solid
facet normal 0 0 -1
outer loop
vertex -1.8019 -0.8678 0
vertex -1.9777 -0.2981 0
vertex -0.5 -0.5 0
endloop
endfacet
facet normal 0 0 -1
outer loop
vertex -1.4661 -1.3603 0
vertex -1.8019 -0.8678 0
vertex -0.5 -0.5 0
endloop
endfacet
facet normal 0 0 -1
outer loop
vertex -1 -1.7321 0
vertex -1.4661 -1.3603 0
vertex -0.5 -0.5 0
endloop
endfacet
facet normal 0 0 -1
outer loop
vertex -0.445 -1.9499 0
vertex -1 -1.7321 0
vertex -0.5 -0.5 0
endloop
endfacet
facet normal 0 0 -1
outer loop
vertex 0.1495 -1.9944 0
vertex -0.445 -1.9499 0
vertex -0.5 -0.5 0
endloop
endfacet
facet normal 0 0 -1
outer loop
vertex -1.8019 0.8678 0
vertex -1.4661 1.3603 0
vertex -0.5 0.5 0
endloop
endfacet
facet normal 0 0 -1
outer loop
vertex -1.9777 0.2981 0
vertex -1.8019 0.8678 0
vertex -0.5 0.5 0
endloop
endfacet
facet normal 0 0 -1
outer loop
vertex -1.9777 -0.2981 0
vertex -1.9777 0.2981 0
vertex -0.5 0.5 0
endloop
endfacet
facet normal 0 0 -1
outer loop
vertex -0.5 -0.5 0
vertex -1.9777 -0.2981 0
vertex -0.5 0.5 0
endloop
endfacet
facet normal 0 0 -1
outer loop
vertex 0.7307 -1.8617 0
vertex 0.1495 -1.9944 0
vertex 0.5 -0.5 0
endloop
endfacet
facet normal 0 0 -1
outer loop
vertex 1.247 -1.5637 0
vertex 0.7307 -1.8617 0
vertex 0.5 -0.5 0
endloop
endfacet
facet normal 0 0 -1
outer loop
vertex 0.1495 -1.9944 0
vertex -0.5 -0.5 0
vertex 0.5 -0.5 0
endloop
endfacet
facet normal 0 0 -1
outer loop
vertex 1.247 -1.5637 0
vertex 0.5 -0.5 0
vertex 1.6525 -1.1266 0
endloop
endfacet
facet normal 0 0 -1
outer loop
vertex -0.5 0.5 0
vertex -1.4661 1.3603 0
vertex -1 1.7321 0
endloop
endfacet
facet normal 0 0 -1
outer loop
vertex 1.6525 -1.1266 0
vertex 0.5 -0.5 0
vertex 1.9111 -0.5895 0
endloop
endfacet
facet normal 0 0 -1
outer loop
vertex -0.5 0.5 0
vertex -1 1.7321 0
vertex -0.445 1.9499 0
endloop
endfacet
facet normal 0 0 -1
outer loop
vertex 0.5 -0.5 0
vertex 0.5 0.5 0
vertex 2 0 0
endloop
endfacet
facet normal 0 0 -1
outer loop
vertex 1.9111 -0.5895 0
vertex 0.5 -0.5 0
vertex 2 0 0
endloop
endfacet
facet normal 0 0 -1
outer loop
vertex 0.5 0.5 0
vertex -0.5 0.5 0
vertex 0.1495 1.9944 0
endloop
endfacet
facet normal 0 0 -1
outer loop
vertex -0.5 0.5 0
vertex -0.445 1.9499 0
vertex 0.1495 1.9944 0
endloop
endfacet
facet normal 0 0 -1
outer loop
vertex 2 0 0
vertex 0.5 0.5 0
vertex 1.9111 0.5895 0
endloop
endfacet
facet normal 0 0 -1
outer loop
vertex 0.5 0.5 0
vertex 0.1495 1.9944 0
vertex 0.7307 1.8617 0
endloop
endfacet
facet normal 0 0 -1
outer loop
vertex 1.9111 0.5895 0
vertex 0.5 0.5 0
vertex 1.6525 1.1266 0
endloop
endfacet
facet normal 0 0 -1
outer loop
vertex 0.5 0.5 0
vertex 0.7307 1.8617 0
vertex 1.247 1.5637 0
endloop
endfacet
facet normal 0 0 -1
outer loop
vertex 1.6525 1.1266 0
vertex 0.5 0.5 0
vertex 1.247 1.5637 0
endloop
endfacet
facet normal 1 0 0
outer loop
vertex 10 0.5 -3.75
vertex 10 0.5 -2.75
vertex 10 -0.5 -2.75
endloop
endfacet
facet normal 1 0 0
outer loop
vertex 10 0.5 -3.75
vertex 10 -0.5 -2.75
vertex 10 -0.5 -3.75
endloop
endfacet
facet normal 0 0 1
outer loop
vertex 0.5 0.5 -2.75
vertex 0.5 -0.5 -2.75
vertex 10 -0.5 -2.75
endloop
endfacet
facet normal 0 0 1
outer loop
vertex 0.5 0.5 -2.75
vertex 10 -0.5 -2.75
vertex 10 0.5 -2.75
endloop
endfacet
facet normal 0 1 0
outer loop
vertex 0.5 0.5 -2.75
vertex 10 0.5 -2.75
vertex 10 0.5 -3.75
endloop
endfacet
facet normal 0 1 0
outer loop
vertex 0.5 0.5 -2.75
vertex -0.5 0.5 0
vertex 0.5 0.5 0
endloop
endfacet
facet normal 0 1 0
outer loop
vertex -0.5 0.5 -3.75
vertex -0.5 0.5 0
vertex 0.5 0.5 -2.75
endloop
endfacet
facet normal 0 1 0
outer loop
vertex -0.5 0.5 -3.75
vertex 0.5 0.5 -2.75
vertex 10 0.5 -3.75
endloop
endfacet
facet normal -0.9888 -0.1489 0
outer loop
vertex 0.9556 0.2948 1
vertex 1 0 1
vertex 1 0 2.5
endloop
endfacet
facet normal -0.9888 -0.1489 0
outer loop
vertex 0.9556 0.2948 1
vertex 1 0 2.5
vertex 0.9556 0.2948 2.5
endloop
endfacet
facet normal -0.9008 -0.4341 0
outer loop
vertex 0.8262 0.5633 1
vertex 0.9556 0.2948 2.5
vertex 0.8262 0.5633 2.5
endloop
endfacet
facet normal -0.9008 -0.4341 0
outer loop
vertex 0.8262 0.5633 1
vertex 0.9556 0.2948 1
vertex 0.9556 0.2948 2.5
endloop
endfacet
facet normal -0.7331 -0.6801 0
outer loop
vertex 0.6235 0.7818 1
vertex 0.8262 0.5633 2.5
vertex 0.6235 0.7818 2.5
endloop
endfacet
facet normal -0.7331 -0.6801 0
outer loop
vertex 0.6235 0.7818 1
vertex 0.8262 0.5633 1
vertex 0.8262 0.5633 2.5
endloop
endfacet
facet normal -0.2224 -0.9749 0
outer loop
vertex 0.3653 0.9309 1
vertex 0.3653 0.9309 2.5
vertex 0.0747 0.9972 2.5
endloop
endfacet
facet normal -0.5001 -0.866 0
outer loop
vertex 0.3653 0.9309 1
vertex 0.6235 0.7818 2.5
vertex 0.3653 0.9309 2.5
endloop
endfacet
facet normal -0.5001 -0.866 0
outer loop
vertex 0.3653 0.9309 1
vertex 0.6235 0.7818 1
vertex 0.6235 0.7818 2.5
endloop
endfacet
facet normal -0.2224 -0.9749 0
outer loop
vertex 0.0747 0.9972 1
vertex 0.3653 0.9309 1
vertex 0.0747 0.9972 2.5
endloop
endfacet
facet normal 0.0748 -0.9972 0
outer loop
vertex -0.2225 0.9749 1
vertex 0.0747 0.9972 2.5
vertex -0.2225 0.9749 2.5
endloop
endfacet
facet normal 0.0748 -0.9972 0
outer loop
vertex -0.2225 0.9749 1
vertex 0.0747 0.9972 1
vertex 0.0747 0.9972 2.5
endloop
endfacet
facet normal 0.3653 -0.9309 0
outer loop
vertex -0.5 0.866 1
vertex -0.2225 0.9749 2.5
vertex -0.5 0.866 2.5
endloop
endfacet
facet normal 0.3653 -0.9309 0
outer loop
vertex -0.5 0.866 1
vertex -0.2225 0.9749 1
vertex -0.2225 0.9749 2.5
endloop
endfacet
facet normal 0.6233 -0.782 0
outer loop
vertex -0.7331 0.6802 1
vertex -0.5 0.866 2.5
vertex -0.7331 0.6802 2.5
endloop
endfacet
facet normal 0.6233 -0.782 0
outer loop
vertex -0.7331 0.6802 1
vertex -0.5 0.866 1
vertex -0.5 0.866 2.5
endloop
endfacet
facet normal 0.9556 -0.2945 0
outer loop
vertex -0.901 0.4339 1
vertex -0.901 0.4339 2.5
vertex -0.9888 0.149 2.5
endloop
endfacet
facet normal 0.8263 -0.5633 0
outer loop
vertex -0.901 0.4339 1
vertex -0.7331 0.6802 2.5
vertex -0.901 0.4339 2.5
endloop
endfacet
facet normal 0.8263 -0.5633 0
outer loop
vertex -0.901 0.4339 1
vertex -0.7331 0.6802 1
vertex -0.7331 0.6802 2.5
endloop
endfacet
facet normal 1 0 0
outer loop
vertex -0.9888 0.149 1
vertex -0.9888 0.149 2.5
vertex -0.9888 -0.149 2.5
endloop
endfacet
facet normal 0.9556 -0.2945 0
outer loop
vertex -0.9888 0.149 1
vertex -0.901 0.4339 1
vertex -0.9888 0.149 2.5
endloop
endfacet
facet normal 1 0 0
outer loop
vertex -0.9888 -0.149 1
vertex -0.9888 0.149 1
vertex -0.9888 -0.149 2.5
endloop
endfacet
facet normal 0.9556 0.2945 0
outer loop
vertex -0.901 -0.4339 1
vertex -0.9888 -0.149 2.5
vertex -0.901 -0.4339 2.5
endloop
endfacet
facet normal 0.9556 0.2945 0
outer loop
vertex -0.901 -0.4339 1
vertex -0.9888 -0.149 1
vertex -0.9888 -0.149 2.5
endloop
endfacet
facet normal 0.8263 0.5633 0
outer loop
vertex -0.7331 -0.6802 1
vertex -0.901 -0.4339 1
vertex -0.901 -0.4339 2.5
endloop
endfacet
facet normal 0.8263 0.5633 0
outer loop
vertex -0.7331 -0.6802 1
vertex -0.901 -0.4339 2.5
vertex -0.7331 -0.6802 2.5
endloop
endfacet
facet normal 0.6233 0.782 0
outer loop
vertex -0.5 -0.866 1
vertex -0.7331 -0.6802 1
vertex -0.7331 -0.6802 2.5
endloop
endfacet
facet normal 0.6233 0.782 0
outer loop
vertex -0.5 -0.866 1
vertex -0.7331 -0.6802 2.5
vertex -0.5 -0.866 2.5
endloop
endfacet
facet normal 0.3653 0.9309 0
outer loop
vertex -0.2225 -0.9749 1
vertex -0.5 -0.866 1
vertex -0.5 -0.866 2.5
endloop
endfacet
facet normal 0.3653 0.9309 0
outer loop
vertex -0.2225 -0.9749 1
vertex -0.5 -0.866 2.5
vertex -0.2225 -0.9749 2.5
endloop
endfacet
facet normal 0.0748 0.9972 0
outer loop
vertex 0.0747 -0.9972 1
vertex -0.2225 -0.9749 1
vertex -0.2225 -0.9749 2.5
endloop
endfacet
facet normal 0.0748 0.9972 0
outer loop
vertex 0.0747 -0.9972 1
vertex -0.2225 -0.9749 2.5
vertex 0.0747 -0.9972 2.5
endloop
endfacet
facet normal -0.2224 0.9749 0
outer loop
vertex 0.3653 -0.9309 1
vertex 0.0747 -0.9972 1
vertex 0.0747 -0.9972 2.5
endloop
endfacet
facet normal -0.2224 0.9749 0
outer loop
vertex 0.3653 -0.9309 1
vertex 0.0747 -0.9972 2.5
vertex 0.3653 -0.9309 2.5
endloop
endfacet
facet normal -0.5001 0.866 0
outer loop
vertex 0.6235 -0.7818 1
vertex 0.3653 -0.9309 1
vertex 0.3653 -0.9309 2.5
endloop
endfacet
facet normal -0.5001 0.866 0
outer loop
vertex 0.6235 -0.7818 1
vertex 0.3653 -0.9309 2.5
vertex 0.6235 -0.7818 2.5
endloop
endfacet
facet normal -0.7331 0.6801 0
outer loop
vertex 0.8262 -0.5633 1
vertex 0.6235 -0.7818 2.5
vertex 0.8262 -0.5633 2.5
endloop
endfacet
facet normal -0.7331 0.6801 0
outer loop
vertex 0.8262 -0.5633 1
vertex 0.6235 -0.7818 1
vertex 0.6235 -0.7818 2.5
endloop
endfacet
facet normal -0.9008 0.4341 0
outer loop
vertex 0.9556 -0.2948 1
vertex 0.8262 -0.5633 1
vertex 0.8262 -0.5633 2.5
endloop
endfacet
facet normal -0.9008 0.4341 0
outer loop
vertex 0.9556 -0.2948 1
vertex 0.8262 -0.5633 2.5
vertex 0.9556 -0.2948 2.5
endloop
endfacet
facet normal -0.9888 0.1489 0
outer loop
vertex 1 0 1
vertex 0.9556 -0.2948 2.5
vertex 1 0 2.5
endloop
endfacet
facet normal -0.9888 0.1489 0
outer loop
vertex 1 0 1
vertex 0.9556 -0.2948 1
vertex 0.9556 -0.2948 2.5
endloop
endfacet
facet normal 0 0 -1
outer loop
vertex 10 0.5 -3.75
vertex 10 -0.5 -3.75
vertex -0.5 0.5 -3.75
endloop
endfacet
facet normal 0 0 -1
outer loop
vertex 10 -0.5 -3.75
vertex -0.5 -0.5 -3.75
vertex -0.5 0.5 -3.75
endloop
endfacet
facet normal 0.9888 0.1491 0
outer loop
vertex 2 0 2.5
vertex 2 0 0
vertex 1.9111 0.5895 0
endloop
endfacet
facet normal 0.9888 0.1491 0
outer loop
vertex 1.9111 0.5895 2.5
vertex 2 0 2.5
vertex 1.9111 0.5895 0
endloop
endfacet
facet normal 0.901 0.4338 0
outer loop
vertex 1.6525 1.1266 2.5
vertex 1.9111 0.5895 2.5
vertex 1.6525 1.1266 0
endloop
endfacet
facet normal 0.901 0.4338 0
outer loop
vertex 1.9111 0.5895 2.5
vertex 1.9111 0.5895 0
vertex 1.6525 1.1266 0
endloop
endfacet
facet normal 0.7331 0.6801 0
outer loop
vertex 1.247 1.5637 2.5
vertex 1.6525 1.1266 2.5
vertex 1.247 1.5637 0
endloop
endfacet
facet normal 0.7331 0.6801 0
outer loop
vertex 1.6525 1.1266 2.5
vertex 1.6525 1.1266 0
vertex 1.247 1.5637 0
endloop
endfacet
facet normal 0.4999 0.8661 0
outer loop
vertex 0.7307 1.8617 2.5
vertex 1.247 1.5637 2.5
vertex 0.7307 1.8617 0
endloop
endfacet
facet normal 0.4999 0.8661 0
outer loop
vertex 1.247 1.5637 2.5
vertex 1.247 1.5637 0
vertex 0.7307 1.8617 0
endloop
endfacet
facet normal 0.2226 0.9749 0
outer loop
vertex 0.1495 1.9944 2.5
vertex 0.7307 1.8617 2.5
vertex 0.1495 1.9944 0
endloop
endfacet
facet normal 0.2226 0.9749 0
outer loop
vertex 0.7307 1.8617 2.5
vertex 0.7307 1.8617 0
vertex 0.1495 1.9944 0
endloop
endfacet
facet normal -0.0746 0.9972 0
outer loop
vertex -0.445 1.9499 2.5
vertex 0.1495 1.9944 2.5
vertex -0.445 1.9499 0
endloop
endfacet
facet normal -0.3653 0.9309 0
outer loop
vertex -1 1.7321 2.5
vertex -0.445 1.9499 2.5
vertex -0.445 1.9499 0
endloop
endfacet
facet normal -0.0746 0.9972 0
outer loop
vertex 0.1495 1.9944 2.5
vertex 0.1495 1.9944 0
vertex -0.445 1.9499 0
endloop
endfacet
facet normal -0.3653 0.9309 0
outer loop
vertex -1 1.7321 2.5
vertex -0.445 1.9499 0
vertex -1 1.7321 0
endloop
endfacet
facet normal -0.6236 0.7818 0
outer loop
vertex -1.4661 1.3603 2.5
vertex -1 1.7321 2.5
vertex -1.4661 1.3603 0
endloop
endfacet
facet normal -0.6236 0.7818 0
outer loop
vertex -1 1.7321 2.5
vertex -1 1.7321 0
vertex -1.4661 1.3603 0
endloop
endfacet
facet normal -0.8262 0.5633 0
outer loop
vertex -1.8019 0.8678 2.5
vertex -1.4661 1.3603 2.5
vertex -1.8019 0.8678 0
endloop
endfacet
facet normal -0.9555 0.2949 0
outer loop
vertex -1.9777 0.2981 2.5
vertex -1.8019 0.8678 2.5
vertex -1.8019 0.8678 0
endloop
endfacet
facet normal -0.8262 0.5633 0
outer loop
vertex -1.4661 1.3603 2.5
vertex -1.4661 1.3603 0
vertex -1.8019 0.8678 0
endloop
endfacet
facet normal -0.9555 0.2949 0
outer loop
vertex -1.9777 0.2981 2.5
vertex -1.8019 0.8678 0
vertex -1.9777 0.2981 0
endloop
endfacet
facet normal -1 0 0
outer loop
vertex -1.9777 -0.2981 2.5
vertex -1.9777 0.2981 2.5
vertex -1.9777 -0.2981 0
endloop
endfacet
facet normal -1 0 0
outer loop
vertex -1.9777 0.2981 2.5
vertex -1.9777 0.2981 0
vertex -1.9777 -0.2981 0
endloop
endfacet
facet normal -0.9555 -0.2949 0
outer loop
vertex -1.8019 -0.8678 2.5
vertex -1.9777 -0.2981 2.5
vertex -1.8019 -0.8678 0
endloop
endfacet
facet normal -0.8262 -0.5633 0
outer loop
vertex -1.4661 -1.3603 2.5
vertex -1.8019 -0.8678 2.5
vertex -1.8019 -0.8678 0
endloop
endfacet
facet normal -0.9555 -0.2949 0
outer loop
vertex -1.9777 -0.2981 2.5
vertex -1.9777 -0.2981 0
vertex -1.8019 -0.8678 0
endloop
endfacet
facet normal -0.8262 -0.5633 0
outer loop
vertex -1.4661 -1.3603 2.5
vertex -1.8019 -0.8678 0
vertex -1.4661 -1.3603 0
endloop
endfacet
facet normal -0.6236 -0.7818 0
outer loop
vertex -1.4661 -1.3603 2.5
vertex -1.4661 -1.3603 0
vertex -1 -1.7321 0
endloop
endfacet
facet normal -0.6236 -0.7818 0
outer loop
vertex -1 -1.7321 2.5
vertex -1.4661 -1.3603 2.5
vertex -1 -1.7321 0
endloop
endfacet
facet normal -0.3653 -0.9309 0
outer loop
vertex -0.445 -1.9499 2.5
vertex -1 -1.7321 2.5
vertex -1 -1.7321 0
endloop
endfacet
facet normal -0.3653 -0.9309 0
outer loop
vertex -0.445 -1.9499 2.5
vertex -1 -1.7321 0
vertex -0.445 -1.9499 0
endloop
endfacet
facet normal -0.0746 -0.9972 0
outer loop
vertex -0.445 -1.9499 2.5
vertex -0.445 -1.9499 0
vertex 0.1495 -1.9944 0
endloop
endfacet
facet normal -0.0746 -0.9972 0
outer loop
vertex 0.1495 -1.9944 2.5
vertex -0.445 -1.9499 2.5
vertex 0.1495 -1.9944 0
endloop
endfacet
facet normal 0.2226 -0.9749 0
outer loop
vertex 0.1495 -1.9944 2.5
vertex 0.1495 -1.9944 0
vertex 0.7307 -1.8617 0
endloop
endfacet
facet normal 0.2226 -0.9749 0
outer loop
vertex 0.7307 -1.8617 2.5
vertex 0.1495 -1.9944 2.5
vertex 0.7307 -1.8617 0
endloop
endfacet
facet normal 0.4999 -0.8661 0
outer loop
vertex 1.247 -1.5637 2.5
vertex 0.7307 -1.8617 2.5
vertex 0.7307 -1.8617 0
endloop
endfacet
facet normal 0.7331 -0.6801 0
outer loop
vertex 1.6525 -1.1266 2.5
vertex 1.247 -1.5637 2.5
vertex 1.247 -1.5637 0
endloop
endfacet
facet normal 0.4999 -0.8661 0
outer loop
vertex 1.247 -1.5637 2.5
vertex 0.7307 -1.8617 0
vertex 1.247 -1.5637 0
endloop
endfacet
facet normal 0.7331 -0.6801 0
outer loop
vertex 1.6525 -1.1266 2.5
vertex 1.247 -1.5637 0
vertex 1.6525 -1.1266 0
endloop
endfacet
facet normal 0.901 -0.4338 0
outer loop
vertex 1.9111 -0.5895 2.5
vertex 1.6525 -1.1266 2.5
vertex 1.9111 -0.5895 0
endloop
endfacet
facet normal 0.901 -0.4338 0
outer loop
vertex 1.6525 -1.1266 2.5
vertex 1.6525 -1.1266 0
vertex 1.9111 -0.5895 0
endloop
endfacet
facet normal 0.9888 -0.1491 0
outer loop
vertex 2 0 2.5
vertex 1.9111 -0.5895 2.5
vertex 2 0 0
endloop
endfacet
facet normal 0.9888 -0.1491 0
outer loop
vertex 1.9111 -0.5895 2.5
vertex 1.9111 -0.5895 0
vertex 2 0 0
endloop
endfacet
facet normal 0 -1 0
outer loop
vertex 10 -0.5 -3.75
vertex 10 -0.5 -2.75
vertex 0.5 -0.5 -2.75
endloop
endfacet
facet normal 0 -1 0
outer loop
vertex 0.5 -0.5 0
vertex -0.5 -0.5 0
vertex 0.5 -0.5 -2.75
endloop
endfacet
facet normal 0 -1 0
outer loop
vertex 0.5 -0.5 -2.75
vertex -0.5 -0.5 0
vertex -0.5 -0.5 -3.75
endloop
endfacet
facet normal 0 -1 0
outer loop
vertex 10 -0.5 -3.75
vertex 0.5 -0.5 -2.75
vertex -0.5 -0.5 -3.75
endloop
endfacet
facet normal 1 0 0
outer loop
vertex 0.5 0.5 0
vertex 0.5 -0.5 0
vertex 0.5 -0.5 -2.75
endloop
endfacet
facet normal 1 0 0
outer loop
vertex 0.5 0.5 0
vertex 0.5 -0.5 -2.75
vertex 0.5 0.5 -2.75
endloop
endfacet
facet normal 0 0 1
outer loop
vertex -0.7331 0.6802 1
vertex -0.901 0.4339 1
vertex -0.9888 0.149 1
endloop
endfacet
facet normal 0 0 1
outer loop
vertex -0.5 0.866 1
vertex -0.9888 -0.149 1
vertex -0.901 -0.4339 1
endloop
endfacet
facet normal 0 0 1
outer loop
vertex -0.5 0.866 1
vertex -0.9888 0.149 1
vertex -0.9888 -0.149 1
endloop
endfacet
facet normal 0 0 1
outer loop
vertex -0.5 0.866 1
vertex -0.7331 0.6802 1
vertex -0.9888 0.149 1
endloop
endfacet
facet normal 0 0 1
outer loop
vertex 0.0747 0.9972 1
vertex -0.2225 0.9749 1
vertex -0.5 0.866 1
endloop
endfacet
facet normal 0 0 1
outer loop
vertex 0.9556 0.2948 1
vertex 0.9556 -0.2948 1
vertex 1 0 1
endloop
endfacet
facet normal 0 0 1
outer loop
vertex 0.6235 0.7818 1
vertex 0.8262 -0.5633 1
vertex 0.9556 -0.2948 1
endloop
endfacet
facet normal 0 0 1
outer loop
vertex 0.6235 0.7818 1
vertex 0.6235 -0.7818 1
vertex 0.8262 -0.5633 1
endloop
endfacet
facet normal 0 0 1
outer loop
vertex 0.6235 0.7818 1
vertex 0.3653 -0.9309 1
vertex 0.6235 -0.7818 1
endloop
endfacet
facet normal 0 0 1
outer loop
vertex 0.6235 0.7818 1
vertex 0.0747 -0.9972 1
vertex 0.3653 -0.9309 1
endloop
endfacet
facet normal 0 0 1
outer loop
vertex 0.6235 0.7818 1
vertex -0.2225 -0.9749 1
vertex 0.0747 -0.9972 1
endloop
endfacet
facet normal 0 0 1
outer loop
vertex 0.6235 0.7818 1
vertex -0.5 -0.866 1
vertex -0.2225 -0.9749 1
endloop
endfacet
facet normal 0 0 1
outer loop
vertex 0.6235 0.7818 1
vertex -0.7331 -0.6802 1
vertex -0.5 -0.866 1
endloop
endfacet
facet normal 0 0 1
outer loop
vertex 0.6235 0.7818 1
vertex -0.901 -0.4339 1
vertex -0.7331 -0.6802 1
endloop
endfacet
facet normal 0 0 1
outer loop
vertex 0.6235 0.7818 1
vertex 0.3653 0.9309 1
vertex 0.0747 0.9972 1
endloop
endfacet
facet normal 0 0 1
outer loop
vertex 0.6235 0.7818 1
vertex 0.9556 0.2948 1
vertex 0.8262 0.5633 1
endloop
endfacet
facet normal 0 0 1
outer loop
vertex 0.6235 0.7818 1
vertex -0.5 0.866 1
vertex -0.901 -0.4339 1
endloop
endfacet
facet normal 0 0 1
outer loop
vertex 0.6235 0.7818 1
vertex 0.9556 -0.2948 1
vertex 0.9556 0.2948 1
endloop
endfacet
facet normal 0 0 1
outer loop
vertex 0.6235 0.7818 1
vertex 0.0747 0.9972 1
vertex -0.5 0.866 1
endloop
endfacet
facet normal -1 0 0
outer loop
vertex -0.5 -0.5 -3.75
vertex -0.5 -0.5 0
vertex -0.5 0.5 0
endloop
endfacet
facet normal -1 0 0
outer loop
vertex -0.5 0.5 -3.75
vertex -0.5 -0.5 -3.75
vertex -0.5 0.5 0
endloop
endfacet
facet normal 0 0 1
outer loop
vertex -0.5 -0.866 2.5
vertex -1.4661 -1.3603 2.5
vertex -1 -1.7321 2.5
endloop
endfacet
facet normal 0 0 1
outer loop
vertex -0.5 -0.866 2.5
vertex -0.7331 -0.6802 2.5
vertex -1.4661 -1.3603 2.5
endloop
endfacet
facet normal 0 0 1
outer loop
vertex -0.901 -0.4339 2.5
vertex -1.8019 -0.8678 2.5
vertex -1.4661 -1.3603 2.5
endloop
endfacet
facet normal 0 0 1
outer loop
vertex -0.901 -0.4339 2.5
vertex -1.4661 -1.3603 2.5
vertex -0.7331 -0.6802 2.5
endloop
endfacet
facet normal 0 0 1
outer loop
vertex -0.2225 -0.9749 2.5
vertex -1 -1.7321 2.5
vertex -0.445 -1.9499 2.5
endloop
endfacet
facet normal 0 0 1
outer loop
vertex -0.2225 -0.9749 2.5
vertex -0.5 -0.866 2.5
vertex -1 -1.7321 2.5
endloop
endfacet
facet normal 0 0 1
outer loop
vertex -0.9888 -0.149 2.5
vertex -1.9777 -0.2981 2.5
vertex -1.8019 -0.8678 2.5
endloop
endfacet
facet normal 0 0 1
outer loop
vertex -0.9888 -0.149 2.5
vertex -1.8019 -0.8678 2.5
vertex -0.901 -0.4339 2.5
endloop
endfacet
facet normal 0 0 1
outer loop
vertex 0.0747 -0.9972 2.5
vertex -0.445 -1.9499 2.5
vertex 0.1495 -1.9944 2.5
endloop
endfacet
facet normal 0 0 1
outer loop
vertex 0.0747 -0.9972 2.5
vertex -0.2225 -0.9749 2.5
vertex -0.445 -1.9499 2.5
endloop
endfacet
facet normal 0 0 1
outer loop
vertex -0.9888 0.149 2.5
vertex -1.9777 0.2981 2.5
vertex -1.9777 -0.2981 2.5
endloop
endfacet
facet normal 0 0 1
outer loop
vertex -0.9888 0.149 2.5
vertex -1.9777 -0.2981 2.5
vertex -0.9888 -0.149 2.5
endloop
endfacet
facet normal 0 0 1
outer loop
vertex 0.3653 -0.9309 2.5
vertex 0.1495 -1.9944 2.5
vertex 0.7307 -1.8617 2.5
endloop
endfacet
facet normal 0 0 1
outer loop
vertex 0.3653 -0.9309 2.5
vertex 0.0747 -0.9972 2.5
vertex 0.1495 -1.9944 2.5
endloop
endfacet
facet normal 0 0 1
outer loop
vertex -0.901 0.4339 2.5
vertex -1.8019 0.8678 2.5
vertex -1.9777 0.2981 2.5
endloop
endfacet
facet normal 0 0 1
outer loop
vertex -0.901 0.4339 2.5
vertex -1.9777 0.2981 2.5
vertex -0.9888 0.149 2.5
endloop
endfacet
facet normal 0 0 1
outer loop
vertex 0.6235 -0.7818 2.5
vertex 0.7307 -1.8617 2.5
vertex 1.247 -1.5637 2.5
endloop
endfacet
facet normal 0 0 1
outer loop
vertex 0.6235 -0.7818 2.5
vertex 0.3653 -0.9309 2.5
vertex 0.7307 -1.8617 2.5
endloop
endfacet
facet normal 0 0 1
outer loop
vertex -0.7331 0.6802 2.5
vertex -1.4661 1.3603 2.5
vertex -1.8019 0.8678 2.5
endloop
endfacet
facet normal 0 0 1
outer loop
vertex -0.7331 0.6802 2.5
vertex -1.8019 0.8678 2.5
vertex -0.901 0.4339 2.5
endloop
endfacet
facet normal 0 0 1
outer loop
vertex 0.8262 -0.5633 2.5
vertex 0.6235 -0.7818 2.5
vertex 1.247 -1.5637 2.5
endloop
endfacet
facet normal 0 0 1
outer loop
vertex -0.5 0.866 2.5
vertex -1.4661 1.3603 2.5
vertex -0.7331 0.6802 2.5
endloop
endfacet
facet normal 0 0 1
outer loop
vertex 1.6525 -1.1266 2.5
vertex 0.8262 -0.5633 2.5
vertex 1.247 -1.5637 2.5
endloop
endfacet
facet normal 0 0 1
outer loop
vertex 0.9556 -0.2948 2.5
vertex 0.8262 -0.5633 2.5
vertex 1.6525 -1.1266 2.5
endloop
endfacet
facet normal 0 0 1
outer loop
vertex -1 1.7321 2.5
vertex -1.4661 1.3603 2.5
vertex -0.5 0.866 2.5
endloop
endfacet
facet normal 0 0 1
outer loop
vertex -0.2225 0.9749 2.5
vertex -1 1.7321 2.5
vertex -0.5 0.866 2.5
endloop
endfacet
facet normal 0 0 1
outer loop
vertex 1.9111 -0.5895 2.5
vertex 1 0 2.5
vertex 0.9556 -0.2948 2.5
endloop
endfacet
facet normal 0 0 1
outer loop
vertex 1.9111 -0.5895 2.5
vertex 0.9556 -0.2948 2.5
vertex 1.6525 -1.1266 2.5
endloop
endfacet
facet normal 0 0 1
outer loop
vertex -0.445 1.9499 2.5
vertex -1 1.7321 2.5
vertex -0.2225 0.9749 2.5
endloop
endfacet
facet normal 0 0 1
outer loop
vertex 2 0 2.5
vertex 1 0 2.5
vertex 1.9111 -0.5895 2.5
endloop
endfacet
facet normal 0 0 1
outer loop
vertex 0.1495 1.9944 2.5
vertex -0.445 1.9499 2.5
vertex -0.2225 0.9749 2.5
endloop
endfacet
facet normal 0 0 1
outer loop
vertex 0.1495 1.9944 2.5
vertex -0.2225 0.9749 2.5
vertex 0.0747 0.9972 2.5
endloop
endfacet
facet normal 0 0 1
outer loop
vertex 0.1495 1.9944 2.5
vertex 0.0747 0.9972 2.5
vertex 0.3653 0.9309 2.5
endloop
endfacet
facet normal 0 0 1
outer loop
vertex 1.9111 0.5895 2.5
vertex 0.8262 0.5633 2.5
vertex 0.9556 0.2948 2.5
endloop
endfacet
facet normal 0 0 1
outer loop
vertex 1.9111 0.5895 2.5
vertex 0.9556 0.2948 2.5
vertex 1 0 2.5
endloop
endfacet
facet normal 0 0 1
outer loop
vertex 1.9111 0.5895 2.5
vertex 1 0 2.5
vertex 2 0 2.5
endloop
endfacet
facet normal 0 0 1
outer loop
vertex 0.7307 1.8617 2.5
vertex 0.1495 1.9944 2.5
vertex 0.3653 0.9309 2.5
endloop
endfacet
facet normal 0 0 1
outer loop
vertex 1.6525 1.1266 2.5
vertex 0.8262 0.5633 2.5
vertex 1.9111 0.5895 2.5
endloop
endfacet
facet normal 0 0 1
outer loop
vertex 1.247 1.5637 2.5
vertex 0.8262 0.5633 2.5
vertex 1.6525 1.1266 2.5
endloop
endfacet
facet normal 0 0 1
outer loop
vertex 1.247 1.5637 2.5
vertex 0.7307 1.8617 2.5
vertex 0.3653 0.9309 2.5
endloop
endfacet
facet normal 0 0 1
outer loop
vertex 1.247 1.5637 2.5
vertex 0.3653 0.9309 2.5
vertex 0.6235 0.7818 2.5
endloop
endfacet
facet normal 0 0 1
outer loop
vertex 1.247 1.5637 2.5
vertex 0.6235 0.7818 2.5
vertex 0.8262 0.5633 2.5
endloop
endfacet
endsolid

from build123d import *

# Parameters (mm, degrees)
SKETCH1_R           = 2
BOSS_EXTRUDE1_DEPTH = 2.5
SHELL1_T            = -1
SKETCH2_W           = 1
SKETCH2_H           = 1
BOSS_EXTRUDE2_DEPTH = 3.75
SKETCH3_W           = 1
SKETCH3_H           = 1
BOSS_EXTRUDE3_DEPTH = 9.5


with BuildPart() as part:
    # Sketch1 → Boss-Extrude1 (new body)
    with BuildSketch(Plane.XY):
        Circle(SKETCH1_R)
    extrude(amount=BOSS_EXTRUDE1_DEPTH)

    # Shell1
    shell1_openings = [part.faces().sort_by_distance(p)[0] for p in [
        (0, 0, 2.5),
    ]]
    offset(amount=SHELL1_T, openings=shell1_openings, kind=Kind.INTERSECTION)

    # Sketch2 → Boss-Extrude2 (add)
    with BuildSketch(Plane(origin=(0, 0, 0), x_dir=(-1, 0, 0), z_dir=(0, 0, -1))):
        Rectangle(SKETCH2_W, SKETCH2_H)
    extrude(amount=BOSS_EXTRUDE2_DEPTH)

    # Sketch3 → Boss-Extrude3 (add)
    with BuildSketch(Plane(origin=(0.5, 0, 0), x_dir=(0, 0, -1), z_dir=(1, 0, 0))):
        with Locations((3.25, 0)):
            Rectangle(SKETCH3_W, SKETCH3_H)
    extrude(amount=BOSS_EXTRUDE3_DEPTH)


solid = part.part
